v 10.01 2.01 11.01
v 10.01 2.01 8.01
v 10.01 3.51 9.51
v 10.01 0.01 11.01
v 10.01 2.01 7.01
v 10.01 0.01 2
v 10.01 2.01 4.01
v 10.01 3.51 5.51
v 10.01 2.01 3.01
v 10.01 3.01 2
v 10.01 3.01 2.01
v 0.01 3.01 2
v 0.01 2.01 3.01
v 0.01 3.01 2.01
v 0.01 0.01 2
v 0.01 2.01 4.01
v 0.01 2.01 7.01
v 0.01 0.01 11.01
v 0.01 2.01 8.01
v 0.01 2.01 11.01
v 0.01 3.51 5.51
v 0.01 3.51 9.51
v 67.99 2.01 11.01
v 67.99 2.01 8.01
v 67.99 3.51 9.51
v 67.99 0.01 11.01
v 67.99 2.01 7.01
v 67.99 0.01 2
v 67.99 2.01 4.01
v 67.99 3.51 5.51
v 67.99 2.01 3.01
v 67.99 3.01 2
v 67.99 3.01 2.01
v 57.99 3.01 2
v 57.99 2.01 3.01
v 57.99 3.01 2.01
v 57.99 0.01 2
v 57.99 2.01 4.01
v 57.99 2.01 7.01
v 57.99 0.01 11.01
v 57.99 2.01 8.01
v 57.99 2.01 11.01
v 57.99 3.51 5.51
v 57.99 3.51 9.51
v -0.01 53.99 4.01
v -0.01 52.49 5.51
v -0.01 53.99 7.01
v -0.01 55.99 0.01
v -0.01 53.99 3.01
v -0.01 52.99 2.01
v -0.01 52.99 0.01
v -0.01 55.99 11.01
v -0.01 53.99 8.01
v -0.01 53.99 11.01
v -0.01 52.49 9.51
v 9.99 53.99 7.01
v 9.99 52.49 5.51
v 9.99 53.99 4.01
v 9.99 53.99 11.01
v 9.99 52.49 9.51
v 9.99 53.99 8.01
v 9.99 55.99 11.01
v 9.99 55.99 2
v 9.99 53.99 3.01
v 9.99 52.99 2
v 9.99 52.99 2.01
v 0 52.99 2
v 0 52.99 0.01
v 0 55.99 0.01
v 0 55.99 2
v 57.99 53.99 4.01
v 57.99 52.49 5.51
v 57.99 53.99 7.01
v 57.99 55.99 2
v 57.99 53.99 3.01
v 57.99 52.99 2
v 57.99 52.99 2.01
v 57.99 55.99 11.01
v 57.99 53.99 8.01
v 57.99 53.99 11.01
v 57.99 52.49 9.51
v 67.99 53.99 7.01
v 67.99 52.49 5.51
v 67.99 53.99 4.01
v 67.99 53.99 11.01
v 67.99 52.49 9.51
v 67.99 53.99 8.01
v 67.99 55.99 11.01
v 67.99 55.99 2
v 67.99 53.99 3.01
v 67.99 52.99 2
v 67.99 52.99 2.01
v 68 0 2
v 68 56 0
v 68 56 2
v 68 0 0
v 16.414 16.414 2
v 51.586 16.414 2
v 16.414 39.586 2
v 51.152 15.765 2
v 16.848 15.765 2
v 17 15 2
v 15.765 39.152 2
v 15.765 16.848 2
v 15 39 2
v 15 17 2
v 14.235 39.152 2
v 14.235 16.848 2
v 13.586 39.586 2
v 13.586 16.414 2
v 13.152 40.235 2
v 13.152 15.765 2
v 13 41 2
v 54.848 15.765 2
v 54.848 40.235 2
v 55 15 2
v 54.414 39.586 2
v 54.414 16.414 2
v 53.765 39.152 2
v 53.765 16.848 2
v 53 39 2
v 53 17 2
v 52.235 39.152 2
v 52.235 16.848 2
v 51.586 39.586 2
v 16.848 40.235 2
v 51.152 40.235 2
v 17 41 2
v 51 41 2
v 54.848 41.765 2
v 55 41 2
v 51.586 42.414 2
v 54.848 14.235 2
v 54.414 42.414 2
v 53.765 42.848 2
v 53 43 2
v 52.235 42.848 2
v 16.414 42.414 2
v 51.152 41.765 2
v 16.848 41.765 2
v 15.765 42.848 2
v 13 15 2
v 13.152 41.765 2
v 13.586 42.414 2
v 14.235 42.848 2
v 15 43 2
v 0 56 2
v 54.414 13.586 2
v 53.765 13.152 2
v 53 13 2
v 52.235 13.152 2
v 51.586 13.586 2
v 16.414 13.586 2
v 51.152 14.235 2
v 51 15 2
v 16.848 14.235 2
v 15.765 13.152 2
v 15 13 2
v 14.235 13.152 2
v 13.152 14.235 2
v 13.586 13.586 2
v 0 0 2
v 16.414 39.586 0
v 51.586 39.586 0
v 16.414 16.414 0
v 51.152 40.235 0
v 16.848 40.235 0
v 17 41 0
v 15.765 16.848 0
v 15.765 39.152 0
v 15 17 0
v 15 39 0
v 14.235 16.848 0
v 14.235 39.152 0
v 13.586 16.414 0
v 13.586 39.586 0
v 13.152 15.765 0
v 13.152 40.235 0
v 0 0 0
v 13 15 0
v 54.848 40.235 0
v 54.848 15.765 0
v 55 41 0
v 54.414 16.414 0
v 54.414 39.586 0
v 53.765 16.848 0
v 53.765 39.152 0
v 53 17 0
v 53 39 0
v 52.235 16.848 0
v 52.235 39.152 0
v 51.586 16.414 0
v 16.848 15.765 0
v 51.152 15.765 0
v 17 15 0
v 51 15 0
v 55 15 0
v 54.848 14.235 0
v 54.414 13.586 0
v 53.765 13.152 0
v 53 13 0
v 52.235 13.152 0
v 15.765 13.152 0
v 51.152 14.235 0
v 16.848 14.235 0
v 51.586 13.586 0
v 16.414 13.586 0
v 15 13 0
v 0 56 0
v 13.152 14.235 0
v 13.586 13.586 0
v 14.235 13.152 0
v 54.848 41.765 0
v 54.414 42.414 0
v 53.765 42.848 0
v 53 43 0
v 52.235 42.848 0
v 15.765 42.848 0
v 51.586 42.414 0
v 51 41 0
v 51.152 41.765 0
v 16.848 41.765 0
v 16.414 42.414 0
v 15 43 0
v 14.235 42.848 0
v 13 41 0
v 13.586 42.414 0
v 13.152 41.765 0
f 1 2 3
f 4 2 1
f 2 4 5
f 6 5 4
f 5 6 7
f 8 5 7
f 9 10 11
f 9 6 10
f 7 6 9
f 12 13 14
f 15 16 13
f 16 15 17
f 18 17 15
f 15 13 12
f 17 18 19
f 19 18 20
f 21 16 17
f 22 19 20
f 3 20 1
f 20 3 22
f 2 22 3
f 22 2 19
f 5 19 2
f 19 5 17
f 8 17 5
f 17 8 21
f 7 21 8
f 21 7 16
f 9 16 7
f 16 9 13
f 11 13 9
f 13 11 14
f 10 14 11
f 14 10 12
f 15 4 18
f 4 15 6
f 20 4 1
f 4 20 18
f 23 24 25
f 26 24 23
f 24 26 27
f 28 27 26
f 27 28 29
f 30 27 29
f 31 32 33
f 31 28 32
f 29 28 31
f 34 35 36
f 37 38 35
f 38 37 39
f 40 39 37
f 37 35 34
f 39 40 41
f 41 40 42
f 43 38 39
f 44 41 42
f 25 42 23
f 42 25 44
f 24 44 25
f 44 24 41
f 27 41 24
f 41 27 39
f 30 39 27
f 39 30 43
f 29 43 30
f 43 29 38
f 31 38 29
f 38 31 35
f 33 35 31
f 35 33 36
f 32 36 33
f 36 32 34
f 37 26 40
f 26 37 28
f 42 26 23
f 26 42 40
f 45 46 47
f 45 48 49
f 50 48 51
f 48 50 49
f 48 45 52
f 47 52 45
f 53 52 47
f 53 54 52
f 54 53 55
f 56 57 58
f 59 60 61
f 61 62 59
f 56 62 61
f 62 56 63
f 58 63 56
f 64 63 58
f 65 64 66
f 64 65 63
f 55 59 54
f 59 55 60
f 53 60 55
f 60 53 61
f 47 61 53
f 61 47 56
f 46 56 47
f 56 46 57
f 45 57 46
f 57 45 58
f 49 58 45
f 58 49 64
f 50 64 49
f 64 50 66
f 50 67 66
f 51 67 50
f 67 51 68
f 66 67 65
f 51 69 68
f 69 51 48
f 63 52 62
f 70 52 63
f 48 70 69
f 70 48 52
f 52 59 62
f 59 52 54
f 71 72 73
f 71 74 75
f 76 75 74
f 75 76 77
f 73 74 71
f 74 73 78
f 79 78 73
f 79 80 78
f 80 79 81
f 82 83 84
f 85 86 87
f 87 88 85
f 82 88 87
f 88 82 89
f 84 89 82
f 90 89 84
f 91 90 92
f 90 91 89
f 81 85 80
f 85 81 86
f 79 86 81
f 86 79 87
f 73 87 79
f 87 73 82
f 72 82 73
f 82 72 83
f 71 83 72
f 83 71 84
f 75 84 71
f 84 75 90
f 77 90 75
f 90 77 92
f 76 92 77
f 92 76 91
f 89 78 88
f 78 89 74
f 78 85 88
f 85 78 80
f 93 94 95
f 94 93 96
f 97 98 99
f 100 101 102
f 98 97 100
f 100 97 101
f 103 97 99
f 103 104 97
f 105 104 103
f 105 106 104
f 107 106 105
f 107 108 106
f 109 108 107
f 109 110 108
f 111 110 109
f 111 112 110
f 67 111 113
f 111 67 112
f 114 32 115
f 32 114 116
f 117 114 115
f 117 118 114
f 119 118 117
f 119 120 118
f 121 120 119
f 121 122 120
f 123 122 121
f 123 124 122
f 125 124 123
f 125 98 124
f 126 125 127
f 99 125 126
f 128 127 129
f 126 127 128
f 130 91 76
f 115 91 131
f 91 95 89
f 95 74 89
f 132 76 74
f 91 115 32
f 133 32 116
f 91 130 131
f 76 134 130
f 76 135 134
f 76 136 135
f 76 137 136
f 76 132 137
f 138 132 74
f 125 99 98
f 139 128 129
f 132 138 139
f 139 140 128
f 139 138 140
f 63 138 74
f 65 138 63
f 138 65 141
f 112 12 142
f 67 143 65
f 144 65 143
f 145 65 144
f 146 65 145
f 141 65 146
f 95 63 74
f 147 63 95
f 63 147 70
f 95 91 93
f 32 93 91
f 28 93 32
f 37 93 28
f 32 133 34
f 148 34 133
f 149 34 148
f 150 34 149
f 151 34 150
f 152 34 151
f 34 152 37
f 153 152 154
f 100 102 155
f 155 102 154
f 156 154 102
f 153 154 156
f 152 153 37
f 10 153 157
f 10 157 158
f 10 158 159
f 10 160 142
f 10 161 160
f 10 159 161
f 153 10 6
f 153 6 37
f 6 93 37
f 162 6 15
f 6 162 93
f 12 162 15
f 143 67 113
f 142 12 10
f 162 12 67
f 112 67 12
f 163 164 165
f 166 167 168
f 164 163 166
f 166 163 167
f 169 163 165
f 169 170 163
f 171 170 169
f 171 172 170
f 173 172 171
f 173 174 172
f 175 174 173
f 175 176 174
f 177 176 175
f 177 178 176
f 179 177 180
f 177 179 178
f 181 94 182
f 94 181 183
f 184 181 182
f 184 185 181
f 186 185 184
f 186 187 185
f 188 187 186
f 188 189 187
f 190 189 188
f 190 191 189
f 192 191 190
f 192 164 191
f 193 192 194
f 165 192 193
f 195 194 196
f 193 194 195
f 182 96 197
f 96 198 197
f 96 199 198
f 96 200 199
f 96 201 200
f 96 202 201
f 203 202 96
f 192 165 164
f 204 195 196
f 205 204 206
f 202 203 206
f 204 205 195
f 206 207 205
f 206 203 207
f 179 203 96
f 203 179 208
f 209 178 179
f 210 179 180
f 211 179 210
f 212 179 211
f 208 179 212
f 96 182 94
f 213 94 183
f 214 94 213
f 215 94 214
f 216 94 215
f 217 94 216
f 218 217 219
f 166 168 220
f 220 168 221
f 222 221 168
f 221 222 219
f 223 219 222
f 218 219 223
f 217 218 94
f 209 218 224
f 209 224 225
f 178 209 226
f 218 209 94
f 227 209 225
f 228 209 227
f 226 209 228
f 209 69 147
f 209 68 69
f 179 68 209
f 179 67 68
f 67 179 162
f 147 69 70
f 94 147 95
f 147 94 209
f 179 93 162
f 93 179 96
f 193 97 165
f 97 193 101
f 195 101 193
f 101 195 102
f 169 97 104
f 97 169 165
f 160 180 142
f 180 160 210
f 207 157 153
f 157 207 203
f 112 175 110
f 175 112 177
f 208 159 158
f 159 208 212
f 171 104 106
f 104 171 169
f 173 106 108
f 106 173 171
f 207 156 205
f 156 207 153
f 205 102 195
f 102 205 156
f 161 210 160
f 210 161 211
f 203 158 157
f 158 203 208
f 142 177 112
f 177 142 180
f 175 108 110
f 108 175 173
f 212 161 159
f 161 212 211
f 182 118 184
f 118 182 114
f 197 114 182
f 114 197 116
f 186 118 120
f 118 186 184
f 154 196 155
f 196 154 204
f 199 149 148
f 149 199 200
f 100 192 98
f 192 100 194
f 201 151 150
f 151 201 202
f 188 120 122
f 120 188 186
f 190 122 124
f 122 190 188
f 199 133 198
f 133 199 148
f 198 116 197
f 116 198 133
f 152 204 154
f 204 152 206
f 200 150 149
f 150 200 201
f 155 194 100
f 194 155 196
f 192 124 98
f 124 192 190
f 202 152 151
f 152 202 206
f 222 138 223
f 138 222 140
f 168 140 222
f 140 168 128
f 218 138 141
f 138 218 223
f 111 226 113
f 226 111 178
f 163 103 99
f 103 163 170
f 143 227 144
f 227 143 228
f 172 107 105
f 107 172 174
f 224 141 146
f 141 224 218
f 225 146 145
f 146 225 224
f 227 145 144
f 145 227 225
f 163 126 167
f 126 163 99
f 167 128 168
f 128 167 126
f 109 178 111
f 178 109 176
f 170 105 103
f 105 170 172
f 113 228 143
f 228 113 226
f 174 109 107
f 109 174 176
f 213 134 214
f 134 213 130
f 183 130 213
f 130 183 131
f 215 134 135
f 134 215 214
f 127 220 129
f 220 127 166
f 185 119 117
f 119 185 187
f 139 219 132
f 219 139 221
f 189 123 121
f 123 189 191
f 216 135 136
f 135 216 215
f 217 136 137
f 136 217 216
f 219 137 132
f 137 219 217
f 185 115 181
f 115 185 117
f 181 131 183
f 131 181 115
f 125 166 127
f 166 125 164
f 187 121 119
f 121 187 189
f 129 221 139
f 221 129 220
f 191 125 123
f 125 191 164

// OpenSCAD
board_width = 52;
board_length = 68;
board_thickness = 1;

base_thickness = 2;
wall_thickness = 2;

camfer_thickness = 1;

standoff_height = 5;

clip_width = 10;
clip_thickness = 1.5;

hole_offset_length = 15;
hole_offset_width = 15;
hole_radius = 2;

difference() {
    union() {
        cube([board_length, board_width+2*wall_thickness, base_thickness]);
        all_clips();
    }
    holes();
}

module board_clip() {
    translate([clip_width,0.01,0.01])
        rotate([0,-90,0])
            linear_extrude(height=clip_width)
                polygon(points=[[0,wall_thickness+camfer_thickness],
                            [base_thickness,wall_thickness+camfer_thickness],
                            [base_thickness+camfer_thickness, wall_thickness],
                            [base_thickness+standoff_height-2*clip_thickness,wall_thickness],
                            [base_thickness+standoff_height-clip_thickness,wall_thickness+clip_thickness],
                            [base_thickness+standoff_height,wall_thickness],
                            [base_thickness+standoff_height+board_thickness,wall_thickness],
                            [base_thickness+standoff_height+board_thickness+clip_thickness,wall_thickness+clip_thickness],
                            [base_thickness+standoff_height+board_thickness+2*clip_thickness,wall_thickness],
                            [base_thickness+standoff_height+board_thickness+2*clip_thickness,0],
                            [0,0]]);
}

module all_clips() {
    translate([0.01,0,0])
        board_clip();
    translate([board_length-clip_width-.01,0,0])
        board_clip();
    translate([clip_width-0.01,board_width+2*wall_thickness,0])
        rotate([0,0,180])
            board_clip();
    translate([board_length-.01,board_width+2*wall_thickness,0])
        rotate([0,0,180])
            board_clip();
}

module holes() {
    translate([hole_offset_length, hole_offset_width, -0.5*base_thickness])
        cylinder(r=hole_radius, h=base_thickness*2, $fn=16);
    translate([board_length-hole_offset_length, hole_offset_width, -0.5*base_thickness])
        cylinder(r=hole_radius, h=base_thickness*2, $fn=16);
    translate([hole_offset_length, board_width+2*wall_thickness-hole_offset_width, -0.5*base_thickness])
        cylinder(r=hole_radius, h=base_thickness*2, $fn=16);
    translate([board_length-hole_offset_length, board_width+2*wall_thickness-hole_offset_width, -0.5*base_thickness])
        cylinder(r=hole_radius, h=base_thickness*2, $fn=16);
}
